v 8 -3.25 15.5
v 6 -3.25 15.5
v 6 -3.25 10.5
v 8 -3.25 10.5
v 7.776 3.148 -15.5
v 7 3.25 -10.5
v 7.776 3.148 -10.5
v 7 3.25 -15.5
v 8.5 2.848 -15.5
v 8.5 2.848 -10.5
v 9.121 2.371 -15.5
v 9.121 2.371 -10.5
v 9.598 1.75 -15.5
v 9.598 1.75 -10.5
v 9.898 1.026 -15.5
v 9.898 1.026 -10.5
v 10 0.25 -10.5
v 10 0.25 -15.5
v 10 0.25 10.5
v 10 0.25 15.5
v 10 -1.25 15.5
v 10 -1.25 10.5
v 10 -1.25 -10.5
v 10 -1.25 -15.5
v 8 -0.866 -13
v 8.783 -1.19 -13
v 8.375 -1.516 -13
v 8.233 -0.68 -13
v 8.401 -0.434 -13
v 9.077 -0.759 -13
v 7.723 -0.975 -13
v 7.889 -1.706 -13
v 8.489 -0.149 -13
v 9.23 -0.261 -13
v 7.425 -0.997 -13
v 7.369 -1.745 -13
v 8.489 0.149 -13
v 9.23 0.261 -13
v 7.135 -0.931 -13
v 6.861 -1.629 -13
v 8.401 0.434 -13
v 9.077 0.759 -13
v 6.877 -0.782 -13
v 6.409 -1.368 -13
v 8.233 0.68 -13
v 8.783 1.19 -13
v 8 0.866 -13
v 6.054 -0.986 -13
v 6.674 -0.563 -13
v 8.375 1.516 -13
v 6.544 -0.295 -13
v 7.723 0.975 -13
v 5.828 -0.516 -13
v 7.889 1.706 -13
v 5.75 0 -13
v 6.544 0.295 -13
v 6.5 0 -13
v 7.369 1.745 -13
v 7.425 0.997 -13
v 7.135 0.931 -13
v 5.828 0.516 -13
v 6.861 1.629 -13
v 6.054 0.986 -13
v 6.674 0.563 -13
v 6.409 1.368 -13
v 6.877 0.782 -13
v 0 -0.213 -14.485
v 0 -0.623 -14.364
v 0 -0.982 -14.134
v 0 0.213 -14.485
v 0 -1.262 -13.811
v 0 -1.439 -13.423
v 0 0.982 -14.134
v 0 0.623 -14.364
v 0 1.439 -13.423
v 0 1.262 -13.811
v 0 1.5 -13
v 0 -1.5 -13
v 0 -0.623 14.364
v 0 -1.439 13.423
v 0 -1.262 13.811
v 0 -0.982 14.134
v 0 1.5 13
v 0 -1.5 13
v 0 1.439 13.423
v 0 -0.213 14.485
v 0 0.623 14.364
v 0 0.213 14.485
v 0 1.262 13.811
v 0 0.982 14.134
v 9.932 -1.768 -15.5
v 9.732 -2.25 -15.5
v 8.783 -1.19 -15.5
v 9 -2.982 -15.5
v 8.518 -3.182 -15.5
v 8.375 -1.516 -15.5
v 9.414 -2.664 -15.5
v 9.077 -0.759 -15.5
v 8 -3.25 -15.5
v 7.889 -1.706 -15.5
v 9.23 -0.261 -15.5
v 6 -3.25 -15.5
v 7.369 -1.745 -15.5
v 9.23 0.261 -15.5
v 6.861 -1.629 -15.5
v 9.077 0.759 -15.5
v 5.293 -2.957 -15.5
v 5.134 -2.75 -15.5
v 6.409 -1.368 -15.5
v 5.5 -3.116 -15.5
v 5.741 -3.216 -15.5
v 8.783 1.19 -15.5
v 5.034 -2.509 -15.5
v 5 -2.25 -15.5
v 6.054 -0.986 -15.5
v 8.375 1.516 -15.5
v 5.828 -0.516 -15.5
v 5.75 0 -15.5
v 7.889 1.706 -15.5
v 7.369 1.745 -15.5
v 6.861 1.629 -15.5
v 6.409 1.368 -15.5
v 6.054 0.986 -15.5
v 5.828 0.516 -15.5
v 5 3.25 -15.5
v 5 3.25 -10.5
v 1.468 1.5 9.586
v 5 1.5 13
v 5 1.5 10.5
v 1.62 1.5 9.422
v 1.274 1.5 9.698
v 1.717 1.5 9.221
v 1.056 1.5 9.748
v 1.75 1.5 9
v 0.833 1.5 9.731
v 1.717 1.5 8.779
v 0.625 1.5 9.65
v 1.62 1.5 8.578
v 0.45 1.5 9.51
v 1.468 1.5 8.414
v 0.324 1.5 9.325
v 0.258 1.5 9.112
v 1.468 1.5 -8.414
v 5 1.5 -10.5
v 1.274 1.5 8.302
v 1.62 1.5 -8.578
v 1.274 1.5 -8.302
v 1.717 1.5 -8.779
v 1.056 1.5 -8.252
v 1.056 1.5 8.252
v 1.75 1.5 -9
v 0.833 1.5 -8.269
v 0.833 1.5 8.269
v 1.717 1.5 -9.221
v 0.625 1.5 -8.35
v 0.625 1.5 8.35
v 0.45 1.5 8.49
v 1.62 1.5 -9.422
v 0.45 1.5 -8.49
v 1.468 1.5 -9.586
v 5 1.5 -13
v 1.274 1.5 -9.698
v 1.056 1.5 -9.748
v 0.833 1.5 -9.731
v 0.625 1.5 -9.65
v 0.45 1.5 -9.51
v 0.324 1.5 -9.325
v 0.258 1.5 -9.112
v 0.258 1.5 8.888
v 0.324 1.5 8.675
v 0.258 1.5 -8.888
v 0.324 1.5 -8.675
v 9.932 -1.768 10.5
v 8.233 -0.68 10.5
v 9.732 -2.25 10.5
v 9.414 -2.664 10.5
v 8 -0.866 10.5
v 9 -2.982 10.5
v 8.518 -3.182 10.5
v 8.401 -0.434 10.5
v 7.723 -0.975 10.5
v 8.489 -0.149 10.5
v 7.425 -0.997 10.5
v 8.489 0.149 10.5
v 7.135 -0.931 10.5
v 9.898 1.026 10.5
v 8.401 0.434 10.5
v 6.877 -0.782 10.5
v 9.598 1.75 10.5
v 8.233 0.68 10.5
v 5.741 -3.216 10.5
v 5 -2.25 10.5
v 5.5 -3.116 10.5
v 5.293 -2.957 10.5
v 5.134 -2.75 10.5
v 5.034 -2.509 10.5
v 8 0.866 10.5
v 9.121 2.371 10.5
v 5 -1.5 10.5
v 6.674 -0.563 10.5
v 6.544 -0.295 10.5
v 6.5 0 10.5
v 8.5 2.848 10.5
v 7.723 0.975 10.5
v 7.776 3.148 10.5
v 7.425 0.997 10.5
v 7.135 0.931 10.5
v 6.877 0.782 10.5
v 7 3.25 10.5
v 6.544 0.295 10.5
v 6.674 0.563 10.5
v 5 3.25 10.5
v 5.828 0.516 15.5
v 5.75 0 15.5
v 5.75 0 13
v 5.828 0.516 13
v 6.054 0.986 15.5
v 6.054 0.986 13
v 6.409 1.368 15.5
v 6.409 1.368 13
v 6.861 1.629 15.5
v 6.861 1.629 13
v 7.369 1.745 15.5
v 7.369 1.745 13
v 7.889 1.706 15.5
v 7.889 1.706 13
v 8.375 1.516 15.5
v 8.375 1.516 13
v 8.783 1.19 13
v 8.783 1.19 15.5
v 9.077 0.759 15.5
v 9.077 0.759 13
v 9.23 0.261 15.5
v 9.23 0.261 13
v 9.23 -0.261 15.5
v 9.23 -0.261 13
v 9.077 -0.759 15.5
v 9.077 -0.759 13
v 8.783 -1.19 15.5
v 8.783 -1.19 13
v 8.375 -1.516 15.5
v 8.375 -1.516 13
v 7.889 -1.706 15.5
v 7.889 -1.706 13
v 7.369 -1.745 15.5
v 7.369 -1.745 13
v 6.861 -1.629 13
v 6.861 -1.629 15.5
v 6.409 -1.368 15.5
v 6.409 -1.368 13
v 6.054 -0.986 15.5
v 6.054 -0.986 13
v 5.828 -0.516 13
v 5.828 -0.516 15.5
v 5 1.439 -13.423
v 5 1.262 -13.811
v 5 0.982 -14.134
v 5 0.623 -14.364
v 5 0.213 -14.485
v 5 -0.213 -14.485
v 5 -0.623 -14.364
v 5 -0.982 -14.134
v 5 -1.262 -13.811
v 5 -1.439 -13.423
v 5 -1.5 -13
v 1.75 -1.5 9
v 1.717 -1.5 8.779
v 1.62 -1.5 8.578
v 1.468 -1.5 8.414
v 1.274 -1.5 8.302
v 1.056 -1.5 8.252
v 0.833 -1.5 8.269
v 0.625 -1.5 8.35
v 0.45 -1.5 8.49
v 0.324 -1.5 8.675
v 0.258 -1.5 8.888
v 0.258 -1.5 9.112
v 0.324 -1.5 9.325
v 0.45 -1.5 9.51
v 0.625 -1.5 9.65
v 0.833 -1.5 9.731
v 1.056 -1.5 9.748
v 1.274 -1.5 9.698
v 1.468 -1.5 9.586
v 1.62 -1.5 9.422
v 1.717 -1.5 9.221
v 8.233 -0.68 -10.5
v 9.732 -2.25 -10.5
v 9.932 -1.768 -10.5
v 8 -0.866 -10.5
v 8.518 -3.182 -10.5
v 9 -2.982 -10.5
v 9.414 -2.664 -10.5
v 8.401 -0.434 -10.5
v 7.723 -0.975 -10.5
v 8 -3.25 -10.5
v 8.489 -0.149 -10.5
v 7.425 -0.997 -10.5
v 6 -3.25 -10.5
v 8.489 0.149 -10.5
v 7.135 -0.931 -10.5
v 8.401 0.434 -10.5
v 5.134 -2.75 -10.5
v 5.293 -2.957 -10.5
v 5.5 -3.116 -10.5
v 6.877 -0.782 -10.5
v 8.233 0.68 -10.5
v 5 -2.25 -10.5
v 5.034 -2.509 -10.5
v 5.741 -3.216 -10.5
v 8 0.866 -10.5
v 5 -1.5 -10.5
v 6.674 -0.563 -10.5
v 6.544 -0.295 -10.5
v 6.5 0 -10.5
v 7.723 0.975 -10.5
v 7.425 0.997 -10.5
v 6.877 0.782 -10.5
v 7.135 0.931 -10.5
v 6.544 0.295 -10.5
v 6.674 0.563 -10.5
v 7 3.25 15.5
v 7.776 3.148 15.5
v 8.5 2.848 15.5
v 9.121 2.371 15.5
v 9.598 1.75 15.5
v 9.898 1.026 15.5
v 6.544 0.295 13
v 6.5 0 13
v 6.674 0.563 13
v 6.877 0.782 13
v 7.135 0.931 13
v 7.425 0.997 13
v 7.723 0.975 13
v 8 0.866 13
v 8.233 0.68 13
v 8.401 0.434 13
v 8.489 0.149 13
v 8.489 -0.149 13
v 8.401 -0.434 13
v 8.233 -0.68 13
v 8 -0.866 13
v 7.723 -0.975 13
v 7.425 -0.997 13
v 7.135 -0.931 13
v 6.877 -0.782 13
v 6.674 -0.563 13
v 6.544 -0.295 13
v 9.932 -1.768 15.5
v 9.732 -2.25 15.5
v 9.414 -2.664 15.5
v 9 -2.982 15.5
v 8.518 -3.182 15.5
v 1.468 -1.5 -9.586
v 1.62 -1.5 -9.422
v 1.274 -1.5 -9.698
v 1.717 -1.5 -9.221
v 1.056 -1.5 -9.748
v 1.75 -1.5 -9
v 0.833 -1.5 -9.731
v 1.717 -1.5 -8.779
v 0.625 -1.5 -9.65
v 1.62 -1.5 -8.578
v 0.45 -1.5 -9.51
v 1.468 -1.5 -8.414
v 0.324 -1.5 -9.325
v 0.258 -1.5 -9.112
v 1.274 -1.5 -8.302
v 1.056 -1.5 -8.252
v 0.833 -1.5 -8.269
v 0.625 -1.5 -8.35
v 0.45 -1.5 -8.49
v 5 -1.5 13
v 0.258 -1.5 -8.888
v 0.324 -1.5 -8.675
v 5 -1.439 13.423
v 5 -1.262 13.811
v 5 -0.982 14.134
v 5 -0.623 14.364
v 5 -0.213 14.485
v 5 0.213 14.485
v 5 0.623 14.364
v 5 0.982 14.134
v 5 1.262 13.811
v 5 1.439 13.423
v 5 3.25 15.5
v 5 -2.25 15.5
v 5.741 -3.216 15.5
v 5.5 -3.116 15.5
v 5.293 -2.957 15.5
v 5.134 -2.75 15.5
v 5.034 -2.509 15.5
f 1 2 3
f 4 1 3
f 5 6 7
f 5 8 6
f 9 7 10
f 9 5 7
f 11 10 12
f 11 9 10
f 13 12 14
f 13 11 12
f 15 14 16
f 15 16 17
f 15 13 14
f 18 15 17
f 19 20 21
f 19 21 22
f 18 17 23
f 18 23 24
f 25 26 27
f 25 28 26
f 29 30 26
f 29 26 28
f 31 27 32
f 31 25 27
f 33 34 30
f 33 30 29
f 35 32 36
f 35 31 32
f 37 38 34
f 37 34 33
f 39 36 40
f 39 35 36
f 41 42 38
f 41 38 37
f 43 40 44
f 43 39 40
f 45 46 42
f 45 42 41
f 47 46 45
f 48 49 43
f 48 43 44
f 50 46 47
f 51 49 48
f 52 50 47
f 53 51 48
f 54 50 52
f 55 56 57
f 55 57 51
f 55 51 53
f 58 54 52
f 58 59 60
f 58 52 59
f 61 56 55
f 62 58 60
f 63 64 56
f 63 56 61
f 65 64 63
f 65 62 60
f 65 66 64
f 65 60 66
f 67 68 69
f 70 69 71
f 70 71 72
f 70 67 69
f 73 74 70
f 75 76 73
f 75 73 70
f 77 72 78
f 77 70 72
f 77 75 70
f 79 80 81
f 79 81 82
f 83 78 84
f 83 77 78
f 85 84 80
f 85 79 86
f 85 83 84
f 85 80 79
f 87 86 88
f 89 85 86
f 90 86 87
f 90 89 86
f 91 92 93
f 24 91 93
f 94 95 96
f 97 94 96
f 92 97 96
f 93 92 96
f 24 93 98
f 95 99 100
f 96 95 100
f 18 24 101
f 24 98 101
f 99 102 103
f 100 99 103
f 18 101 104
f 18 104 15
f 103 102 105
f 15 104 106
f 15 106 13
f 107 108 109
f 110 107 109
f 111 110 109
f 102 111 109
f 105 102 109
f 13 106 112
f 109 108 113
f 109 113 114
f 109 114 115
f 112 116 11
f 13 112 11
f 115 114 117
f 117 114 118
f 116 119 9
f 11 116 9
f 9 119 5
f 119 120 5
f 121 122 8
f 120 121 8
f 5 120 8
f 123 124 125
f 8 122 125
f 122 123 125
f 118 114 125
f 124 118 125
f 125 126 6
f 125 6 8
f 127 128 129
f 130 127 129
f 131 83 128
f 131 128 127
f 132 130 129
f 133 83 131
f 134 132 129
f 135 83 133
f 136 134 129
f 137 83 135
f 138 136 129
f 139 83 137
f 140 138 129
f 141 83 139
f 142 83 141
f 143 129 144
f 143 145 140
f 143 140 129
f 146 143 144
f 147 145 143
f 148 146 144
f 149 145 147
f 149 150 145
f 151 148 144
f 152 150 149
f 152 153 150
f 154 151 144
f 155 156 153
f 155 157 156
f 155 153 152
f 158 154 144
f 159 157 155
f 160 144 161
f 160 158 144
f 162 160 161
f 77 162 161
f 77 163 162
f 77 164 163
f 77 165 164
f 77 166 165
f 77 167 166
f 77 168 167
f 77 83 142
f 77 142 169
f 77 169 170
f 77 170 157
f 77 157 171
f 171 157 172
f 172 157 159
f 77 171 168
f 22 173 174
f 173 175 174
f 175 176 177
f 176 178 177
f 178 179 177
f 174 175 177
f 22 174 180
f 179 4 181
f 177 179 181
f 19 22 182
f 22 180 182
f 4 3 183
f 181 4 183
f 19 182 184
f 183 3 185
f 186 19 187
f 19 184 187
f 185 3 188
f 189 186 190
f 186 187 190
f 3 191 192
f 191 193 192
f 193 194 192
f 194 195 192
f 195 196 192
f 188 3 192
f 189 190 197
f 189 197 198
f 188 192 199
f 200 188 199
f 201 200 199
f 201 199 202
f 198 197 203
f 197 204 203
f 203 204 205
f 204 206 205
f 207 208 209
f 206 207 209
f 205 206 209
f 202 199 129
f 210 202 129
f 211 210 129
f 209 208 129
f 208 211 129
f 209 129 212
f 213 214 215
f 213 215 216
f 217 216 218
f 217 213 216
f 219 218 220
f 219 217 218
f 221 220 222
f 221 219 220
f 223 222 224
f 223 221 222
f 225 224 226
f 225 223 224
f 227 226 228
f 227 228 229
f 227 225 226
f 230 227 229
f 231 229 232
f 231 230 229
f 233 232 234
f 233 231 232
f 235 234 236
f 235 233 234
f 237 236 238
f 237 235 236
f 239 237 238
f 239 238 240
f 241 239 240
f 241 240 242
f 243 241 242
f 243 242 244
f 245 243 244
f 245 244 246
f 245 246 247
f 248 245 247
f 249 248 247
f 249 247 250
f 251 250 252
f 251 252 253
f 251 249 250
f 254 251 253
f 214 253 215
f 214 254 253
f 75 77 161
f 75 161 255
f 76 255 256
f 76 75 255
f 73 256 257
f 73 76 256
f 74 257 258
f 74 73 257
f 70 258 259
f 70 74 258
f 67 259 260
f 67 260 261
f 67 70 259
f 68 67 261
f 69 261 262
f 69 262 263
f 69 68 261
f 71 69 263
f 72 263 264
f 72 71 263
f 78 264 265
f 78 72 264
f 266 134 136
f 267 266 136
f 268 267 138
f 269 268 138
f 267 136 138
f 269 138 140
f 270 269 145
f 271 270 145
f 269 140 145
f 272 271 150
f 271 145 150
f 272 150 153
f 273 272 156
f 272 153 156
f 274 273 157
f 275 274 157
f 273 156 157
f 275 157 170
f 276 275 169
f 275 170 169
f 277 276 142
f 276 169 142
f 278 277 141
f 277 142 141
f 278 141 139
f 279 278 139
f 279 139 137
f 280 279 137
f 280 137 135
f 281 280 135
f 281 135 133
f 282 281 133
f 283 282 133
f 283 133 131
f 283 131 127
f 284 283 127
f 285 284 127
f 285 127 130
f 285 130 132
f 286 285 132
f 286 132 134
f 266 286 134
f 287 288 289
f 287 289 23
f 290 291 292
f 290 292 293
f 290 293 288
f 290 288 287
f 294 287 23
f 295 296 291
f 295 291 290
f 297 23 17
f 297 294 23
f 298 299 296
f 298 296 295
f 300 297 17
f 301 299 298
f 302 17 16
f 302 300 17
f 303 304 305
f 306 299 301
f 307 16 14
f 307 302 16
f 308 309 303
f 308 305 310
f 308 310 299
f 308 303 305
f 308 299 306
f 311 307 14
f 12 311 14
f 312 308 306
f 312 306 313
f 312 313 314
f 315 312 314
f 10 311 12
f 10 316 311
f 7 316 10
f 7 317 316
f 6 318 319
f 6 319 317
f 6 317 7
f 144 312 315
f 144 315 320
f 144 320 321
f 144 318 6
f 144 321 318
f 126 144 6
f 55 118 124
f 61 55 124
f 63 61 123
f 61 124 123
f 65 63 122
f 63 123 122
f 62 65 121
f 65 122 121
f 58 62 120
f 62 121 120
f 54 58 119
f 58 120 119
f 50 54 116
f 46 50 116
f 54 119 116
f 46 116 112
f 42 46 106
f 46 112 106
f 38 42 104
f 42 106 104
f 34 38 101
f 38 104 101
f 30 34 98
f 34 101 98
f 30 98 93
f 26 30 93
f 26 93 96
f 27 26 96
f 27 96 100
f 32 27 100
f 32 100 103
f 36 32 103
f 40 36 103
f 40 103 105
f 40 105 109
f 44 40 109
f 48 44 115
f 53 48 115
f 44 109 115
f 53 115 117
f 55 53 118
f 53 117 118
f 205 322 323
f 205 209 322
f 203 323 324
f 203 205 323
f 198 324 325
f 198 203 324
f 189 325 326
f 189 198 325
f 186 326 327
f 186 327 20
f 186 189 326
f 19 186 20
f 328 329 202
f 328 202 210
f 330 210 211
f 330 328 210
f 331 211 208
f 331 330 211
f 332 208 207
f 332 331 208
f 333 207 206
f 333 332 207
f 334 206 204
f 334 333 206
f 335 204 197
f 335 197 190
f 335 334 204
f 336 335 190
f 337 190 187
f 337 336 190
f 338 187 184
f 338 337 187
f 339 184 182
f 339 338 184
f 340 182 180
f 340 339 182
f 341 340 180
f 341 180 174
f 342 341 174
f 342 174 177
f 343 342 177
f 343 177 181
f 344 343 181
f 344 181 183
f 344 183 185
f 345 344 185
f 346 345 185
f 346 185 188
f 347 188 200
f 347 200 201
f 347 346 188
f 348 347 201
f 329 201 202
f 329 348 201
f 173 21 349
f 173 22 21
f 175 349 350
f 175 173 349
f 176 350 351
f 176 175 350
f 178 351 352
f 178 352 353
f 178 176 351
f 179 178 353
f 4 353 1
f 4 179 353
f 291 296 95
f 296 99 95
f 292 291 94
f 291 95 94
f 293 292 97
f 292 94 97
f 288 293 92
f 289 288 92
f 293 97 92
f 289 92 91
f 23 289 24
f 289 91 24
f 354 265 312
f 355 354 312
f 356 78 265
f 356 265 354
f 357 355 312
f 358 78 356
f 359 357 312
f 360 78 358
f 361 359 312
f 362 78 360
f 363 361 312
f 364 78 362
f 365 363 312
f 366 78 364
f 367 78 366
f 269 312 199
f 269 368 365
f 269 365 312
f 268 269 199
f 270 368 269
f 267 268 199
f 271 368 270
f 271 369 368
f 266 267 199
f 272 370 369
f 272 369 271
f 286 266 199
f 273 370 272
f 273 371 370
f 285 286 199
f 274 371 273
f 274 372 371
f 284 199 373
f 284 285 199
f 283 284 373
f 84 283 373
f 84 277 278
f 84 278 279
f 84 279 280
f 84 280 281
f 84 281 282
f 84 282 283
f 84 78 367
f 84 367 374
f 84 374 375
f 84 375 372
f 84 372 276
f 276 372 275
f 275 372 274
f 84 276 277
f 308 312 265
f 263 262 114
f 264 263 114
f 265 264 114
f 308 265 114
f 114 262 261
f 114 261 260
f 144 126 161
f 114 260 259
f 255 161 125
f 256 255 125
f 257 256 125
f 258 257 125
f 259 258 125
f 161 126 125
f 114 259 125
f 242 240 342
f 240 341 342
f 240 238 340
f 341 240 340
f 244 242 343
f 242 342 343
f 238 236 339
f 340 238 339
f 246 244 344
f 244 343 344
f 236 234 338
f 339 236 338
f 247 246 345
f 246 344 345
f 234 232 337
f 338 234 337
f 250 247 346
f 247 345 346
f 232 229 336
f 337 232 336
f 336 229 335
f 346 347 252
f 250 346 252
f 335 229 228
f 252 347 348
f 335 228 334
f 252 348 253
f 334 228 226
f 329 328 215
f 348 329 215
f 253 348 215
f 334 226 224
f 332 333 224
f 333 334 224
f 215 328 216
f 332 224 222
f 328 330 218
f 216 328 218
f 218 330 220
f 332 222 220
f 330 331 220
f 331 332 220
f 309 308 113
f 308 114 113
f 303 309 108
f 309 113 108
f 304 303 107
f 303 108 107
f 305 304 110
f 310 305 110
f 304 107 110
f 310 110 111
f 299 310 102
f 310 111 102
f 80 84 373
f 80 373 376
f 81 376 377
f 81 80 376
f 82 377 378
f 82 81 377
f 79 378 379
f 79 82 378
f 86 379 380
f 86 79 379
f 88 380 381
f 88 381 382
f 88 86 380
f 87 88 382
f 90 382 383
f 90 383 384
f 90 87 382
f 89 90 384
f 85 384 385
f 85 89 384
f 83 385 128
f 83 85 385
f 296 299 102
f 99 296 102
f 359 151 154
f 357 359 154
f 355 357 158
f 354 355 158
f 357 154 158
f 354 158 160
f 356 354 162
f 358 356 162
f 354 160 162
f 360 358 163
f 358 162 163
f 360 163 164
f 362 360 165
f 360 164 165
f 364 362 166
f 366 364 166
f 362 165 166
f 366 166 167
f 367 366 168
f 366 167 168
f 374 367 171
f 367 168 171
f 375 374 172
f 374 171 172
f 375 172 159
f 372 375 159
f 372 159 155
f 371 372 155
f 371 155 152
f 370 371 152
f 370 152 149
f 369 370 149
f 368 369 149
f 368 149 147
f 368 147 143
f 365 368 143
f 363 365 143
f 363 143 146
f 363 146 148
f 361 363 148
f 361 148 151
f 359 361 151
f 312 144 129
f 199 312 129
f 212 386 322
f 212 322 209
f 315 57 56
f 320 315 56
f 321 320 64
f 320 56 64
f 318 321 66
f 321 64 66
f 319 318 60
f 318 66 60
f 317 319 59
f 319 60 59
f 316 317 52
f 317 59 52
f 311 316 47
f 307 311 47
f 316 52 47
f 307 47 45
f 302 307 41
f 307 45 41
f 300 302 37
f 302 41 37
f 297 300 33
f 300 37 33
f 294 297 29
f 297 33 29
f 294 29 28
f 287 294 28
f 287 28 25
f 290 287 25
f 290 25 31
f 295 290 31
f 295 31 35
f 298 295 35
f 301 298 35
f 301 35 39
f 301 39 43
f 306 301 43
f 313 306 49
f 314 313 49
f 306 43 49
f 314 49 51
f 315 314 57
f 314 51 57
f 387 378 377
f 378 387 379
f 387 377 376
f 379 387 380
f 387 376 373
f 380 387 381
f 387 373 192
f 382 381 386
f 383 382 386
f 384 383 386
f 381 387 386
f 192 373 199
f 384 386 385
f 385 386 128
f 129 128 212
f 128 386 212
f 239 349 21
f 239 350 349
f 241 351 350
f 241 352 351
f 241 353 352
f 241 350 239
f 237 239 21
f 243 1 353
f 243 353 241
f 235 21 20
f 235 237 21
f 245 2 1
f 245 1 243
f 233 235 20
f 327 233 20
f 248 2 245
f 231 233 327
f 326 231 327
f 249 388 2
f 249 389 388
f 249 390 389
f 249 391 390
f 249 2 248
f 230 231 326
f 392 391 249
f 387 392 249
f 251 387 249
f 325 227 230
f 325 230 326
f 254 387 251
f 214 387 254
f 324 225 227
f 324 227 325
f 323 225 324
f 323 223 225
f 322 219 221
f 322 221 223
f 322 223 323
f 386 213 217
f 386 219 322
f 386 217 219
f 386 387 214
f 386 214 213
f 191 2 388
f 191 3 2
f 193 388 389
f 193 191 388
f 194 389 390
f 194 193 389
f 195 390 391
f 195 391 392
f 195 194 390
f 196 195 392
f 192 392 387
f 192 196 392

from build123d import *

# Parameters (mm, degrees)
SALIENTE_EXTRUIR1_DEPTH = 5
CROQUIS2_W              = 5
CROQUIS2_H              = 6.5
SALIENTE_EXTRUIR3_DEPTH = 5
REDONDEO1_R             = 3
REDONDEO2_R             = 2
REDONDEO3_R             = 1
CROQUIS4_R              = 1.75
CORTAR_EXTRUIR1_DEPTH   = 2.5
CROQUIS5_R              = 1
CORTAR_EXTRUIR2_DEPTH   = 2.5
CROQUIS6_R              = 0.75
CORTAR_EXTRUIR3_DEPTH   = 5


with BuildPart() as part:
    # Croquis1 → Saliente-Extruir1 (new body)
    with BuildSketch(Plane(origin=(0, 0, 0), x_dir=(0, 0, -1), z_dir=(1, 0, 0))):
        with BuildLine():
            Line((-13, 1.5), (13, 1.5))
            ThreePointArc((13, 1.5), (14.5, 0), (13, -1.5))
            Line((13, -1.5), (-13, -1.5))
            ThreePointArc((-13, -1.5), (-14.5, 0), (-13, 1.5))
        make_face()
    extrude(amount=SALIENTE_EXTRUIR1_DEPTH)

    # Croquis2 → Saliente-Extruir3 (add)
    with BuildSketch(Plane(origin=(5, 0, 0), x_dir=(0, 0, -1), z_dir=(1, 0, 0))):
        with Locations((-13, 0)):
            Rectangle(CROQUIS2_W, CROQUIS2_H)
        with Locations((13, 0)):
            Rectangle(CROQUIS2_W, CROQUIS2_H)
    extrude(amount=SALIENTE_EXTRUIR3_DEPTH)

    # Redondeo1
    redondeo1_edges = [part.edges().sort_by_distance(p)[0] for p in [
        (10, 3.25, 13),
        (10, 3.25, -13),
    ]]
    fillet(redondeo1_edges, radius=REDONDEO1_R)

    # Redondeo2
    redondeo2_edges = [part.edges().sort_by_distance(p)[0] for p in [
        (10, -3.25, 13),
        (10, -3.25, -13),
    ]]
    fillet(redondeo2_edges, radius=REDONDEO2_R)

    # Redondeo3
    redondeo3_edges = [part.edges().sort_by_distance(p)[0] for p in [
        (5, -3.25, 13),
        (5, -3.25, -13),
    ]]
    fillet(redondeo3_edges, radius=REDONDEO3_R)

    # Croquis4 → Cortar-Extruir1 (cut)
    with BuildSketch(Plane(origin=(0, 0, -15.5), x_dir=(-1, 0, 0), z_dir=(0, 0, -1))):
        with Locations((-7.5, 0)):
            Circle(CROQUIS4_R)
    cortar_extruir1 = extrude(amount=-CORTAR_EXTRUIR1_DEPTH, mode=Mode.SUBTRACT)

    # Croquis5 → Cortar-Extruir2 (cut)
    with BuildSketch(Plane(origin=(0, 0, -13), x_dir=(-1, 0, 0), z_dir=(0, 0, -1))):
        with Locations((-7.5, 0)):
            Circle(CROQUIS5_R)
    cortar_extruir2 = extrude(amount=-CORTAR_EXTRUIR2_DEPTH, mode=Mode.SUBTRACT)

    # Simetría2: Cortar-Extruir1, Cortar-Extruir2 across plane
    add(cortar_extruir1.mirror(Plane.XY), mode=Mode.SUBTRACT)
    add(cortar_extruir2.mirror(Plane.XY), mode=Mode.SUBTRACT)

    # Croquis6 → Cortar-Extruir3 (cut)
    with BuildSketch(Plane(origin=(0, 1.5, 0), x_dir=(1, 0, 0), z_dir=(0, 1, 0))):
        with Locations((1, 9)):
            Circle(CROQUIS6_R)
        with Locations((1, -9)):
            Circle(CROQUIS6_R)
    extrude(amount=-CORTAR_EXTRUIR3_DEPTH, mode=Mode.SUBTRACT)


solid = part.part
